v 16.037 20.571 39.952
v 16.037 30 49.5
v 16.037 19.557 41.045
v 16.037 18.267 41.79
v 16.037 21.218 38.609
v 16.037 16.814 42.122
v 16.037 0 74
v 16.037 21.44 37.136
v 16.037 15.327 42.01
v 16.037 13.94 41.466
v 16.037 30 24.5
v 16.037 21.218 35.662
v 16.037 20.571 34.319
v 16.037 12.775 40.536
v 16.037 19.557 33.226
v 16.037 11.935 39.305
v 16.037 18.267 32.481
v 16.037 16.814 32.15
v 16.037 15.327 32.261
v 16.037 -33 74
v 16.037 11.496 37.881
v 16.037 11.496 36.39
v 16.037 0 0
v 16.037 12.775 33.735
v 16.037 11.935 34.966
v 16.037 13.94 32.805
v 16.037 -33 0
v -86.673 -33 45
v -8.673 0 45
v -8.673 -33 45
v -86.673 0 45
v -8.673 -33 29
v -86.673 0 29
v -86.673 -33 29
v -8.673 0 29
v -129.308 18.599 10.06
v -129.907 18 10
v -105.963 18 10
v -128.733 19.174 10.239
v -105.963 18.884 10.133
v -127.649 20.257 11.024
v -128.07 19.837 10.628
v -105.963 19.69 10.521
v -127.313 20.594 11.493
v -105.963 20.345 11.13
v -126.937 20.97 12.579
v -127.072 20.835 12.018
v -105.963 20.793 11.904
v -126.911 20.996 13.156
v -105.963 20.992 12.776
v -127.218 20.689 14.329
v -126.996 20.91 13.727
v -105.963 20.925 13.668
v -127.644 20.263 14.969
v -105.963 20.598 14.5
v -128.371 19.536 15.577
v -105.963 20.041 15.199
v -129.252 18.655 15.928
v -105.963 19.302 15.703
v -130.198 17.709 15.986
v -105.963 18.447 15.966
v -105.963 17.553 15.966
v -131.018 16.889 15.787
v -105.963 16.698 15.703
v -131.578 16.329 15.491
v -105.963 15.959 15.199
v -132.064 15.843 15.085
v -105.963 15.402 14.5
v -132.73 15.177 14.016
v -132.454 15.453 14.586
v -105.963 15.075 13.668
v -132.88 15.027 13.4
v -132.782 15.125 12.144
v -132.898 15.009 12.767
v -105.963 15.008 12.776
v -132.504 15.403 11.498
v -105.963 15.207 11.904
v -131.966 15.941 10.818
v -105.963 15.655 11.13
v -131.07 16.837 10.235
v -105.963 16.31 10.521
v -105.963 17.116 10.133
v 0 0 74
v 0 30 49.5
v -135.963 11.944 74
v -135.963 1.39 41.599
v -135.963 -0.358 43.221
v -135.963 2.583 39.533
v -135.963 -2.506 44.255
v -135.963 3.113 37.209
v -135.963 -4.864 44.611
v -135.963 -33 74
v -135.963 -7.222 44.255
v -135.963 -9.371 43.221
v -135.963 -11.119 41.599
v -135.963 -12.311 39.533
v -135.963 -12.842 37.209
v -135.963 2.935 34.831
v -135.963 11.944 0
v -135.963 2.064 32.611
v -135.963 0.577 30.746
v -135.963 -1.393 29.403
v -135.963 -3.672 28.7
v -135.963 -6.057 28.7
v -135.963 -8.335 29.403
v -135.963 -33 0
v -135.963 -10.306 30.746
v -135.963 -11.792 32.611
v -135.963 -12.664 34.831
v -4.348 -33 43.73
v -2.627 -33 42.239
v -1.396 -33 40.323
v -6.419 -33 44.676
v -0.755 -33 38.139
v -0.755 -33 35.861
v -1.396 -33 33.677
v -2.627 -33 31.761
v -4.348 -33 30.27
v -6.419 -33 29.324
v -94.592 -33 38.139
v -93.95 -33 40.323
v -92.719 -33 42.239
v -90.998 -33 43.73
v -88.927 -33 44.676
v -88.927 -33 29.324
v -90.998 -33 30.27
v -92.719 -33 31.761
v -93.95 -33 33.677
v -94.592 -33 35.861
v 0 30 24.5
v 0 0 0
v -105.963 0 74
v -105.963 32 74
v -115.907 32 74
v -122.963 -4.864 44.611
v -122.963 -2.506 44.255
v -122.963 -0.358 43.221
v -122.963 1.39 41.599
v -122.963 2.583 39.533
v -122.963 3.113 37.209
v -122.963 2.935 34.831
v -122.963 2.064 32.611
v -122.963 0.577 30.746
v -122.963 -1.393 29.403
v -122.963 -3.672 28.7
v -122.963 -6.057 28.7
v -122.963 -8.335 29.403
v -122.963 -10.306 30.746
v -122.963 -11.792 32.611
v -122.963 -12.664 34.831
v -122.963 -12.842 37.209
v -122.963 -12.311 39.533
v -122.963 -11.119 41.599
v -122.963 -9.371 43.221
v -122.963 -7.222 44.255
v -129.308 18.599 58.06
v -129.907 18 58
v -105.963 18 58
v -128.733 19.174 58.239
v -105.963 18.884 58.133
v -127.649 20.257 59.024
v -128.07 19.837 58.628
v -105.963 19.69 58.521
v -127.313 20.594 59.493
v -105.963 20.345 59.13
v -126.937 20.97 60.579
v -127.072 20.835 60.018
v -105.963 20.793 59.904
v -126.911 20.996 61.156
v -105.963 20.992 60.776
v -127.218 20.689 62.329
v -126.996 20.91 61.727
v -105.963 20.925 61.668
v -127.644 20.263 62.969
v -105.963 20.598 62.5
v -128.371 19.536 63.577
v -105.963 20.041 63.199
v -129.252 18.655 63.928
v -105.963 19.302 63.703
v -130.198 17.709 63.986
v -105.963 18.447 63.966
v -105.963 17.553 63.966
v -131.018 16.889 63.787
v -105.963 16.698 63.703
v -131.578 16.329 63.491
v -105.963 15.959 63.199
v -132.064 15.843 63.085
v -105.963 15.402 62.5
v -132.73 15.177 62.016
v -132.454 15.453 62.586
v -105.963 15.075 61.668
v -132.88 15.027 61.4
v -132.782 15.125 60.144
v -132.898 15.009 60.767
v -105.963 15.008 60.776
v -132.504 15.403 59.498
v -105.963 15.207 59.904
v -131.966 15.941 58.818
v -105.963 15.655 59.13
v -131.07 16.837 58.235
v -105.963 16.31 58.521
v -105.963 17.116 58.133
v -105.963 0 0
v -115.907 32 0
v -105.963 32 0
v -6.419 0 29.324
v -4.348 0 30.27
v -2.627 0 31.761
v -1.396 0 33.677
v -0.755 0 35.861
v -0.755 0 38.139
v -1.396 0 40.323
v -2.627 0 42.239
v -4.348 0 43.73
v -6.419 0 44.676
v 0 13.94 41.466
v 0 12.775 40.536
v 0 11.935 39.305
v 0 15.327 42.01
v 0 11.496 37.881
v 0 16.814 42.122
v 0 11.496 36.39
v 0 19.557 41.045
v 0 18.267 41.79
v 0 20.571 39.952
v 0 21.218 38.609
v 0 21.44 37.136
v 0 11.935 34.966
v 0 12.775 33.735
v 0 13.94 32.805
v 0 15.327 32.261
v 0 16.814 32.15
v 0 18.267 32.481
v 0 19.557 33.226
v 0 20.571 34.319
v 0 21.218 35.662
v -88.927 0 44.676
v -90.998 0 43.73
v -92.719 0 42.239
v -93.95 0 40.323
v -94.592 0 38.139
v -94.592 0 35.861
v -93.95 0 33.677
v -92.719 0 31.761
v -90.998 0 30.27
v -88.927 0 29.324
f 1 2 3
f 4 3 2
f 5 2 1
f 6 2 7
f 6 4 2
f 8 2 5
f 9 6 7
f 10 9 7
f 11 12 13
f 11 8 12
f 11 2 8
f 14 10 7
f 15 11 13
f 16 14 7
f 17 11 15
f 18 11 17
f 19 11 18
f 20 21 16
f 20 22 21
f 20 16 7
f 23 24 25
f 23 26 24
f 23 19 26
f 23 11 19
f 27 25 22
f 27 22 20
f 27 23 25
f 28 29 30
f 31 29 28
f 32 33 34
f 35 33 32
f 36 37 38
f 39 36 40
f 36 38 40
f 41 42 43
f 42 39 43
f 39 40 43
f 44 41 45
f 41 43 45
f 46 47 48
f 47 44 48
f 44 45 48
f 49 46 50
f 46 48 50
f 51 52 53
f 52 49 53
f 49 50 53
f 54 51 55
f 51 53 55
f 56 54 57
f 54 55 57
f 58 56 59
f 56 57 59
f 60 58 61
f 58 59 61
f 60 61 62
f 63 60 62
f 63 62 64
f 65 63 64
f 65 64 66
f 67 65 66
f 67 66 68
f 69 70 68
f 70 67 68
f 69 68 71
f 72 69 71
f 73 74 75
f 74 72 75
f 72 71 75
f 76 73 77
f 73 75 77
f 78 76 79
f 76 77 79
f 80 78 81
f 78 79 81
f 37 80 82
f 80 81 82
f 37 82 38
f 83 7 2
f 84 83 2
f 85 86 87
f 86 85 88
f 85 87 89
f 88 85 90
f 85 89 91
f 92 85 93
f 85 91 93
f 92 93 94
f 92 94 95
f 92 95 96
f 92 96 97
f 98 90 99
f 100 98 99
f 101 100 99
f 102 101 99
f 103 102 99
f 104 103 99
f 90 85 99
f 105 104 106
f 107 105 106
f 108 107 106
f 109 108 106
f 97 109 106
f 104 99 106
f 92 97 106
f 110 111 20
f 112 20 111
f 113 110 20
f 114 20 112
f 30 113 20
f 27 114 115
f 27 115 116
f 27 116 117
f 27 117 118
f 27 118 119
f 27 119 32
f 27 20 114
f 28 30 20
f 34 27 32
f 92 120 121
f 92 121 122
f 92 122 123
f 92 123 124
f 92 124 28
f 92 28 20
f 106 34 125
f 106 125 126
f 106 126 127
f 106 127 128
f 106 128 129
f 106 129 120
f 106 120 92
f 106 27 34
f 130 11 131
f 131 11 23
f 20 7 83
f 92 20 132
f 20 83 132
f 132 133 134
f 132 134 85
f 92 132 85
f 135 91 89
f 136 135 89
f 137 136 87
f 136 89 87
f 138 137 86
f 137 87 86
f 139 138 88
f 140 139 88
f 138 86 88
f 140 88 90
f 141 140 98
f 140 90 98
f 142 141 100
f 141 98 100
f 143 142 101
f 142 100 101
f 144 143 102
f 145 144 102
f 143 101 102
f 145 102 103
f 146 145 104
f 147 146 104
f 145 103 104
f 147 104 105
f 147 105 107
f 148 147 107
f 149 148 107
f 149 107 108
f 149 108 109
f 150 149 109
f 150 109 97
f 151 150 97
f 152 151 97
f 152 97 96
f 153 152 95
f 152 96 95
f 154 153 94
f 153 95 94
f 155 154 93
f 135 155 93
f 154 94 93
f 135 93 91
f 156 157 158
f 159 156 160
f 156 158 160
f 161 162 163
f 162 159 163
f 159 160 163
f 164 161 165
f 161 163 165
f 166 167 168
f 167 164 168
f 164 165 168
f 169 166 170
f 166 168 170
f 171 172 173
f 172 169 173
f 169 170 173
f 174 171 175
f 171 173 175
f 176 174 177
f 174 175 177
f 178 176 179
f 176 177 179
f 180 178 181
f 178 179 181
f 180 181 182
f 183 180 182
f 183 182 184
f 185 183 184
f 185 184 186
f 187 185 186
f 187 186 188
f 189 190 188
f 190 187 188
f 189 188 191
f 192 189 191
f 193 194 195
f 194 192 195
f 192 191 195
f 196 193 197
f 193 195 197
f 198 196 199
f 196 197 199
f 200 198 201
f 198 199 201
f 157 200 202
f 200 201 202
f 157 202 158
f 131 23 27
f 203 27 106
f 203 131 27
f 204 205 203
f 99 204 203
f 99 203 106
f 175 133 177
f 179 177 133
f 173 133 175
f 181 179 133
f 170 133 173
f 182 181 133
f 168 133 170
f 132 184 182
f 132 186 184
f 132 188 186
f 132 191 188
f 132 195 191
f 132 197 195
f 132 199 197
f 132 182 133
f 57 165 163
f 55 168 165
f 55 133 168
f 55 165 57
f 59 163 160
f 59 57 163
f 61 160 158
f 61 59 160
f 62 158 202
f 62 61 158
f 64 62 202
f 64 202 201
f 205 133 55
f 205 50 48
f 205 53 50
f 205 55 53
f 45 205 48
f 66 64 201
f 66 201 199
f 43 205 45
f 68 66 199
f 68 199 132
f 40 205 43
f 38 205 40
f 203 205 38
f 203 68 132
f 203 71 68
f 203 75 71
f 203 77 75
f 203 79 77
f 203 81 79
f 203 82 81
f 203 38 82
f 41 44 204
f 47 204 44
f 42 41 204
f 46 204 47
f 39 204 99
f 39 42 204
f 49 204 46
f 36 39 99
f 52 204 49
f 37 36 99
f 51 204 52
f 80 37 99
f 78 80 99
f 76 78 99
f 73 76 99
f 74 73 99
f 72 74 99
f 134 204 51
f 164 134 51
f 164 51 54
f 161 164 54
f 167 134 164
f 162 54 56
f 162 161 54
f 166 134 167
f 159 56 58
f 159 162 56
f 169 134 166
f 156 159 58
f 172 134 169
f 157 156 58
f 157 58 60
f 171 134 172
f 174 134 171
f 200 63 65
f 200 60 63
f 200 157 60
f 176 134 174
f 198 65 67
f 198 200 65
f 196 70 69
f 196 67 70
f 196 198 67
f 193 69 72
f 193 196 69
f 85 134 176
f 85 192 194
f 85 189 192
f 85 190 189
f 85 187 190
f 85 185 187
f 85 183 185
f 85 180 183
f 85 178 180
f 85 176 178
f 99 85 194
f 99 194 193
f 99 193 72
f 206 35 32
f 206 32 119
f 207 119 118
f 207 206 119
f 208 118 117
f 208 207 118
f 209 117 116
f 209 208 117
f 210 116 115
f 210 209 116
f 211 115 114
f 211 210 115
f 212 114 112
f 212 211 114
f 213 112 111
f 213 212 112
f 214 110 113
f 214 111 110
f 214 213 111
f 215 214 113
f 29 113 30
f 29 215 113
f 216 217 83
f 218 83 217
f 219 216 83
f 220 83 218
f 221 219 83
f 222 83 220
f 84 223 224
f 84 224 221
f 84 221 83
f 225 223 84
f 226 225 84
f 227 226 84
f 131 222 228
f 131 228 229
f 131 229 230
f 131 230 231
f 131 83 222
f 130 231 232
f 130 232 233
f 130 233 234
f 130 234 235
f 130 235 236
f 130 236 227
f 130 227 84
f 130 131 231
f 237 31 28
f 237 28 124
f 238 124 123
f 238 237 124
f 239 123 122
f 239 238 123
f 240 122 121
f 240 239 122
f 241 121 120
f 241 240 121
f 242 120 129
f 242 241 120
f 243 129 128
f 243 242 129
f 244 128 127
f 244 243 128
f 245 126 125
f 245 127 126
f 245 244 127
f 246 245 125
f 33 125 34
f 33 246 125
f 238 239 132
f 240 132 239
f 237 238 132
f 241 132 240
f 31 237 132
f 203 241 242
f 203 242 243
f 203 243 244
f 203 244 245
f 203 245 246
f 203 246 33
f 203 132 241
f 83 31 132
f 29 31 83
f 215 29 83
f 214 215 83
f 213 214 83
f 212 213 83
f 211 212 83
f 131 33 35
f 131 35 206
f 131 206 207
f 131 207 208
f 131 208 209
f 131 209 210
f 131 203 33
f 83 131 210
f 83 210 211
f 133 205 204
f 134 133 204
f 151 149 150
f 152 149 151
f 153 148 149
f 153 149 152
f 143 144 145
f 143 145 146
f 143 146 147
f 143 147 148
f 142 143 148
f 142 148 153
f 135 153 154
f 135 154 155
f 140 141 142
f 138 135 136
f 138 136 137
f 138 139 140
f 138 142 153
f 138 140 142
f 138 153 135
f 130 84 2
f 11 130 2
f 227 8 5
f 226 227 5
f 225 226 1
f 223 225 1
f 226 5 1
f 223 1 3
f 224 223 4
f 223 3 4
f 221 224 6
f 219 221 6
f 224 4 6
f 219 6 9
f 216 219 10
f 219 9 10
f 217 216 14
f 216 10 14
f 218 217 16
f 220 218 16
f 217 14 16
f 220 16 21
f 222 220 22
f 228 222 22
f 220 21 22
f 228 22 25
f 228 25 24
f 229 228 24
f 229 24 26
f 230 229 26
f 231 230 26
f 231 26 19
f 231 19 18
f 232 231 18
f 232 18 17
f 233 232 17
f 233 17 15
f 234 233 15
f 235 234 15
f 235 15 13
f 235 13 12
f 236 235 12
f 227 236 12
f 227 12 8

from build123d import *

# Parameters (mm, degrees)
BOSS_EXTRUDE3_DEPTH = 74
CUT_EXTRUDE5_DEPTH  = 74
SKETCH14_R          = 3
CUT_EXTRUDE6_DEPTH  = 74
SKETCH15_R          = 8
CUT_EXTRUDE7_DEPTH  = 13
CUT_EXTRUDE8_DEPTH  = 90
CUT_EXTRUDE10_DEPTH = 22
SKETCH20_R          = 5
CUT_EXTRUDE11_DEPTH = 22


with BuildPart() as part:
    # Sketch2 → Boss-Extrude3 (new body)
    with BuildSketch(Plane.XY):
        Polygon((0, 0), (0, 30), (16.036697248, 30), (16.036697248, -33), (-135.963302752, -33), (-135.963302752, 18), (-135.963302752, 32), (-115.963302752, 32), (-105.963302752, 32), (-105.963302752, 0), align=None)
    extrude(amount=BOSS_EXTRUDE3_DEPTH)

    # Sketch11 → Cut-Extrude5 (cut)
    with BuildSketch(Plane.XY.offset(74)):
        Polygon((-135.963302752, 11.943655514), (-135.963302752, 32), (-115.906958266, 32), align=None)
    extrude(amount=-CUT_EXTRUDE5_DEPTH, mode=Mode.SUBTRACT)

    # Sketch14 → Cut-Extrude6 (cut)
    with BuildSketch(Plane(origin=(-105.963302752, 0, 0), x_dir=(0, 0, -1), z_dir=(1, 0, 0))):
        with Locations((-61, 18)):
            Circle(SKETCH14_R)
        with Locations((-13, 18)):
            Circle(SKETCH14_R)
    extrude(amount=-CUT_EXTRUDE6_DEPTH, mode=Mode.SUBTRACT)

    # Sketch15 → Cut-Extrude7 (cut)
    with BuildSketch(Plane.ZY.offset(135.963302752)):
        with Locations((36.610721791, -4.86425639)):
            Circle(SKETCH15_R)
    extrude(amount=-CUT_EXTRUDE7_DEPTH, mode=Mode.SUBTRACT)

    # Sketch16 → Cut-Extrude8 (cut)
    with BuildSketch(Plane(origin=(0, 0, 0), x_dir=(1, 0, 0), z_dir=(0, 1, 0))):
        with BuildLine():
            Line((-86.67307708, -29), (-8.67307708, -29))
            ThreePointArc((-8.67307708, -29), (-0.67307708, -37), (-8.67307708, -45))
            Line((-8.67307708, -45), (-86.67307708, -45))
            ThreePointArc((-86.67307708, -45), (-94.67307708, -37), (-86.67307708, -29))
        make_face()
    extrude(amount=-CUT_EXTRUDE8_DEPTH, mode=Mode.SUBTRACT)

    # Sketch19 → Cut-Extrude10 (cut)
    with BuildSketch(Plane(origin=(16.036697248, 0, 0), x_dir=(0, 0, -1), z_dir=(1, 0, 0))):
        Polygon((-74, 30), (-74, 0), (-49.5, 30), align=None)
        Polygon((0, 0), (0, 30), (-24.5, 30), align=None)
    extrude(amount=-CUT_EXTRUDE10_DEPTH, mode=Mode.SUBTRACT)

    # Sketch20 → Cut-Extrude11 (cut)
    with BuildSketch(Plane(origin=(16.036697248, 0, 0), x_dir=(0, 0, -1), z_dir=(1, 0, 0))):
        with Locations(Location((-37.135567798, 16.44, 0), (0, 0, 90))):
            Circle(SKETCH20_R)
    extrude(amount=-CUT_EXTRUDE11_DEPTH, mode=Mode.SUBTRACT)


solid = part.part
